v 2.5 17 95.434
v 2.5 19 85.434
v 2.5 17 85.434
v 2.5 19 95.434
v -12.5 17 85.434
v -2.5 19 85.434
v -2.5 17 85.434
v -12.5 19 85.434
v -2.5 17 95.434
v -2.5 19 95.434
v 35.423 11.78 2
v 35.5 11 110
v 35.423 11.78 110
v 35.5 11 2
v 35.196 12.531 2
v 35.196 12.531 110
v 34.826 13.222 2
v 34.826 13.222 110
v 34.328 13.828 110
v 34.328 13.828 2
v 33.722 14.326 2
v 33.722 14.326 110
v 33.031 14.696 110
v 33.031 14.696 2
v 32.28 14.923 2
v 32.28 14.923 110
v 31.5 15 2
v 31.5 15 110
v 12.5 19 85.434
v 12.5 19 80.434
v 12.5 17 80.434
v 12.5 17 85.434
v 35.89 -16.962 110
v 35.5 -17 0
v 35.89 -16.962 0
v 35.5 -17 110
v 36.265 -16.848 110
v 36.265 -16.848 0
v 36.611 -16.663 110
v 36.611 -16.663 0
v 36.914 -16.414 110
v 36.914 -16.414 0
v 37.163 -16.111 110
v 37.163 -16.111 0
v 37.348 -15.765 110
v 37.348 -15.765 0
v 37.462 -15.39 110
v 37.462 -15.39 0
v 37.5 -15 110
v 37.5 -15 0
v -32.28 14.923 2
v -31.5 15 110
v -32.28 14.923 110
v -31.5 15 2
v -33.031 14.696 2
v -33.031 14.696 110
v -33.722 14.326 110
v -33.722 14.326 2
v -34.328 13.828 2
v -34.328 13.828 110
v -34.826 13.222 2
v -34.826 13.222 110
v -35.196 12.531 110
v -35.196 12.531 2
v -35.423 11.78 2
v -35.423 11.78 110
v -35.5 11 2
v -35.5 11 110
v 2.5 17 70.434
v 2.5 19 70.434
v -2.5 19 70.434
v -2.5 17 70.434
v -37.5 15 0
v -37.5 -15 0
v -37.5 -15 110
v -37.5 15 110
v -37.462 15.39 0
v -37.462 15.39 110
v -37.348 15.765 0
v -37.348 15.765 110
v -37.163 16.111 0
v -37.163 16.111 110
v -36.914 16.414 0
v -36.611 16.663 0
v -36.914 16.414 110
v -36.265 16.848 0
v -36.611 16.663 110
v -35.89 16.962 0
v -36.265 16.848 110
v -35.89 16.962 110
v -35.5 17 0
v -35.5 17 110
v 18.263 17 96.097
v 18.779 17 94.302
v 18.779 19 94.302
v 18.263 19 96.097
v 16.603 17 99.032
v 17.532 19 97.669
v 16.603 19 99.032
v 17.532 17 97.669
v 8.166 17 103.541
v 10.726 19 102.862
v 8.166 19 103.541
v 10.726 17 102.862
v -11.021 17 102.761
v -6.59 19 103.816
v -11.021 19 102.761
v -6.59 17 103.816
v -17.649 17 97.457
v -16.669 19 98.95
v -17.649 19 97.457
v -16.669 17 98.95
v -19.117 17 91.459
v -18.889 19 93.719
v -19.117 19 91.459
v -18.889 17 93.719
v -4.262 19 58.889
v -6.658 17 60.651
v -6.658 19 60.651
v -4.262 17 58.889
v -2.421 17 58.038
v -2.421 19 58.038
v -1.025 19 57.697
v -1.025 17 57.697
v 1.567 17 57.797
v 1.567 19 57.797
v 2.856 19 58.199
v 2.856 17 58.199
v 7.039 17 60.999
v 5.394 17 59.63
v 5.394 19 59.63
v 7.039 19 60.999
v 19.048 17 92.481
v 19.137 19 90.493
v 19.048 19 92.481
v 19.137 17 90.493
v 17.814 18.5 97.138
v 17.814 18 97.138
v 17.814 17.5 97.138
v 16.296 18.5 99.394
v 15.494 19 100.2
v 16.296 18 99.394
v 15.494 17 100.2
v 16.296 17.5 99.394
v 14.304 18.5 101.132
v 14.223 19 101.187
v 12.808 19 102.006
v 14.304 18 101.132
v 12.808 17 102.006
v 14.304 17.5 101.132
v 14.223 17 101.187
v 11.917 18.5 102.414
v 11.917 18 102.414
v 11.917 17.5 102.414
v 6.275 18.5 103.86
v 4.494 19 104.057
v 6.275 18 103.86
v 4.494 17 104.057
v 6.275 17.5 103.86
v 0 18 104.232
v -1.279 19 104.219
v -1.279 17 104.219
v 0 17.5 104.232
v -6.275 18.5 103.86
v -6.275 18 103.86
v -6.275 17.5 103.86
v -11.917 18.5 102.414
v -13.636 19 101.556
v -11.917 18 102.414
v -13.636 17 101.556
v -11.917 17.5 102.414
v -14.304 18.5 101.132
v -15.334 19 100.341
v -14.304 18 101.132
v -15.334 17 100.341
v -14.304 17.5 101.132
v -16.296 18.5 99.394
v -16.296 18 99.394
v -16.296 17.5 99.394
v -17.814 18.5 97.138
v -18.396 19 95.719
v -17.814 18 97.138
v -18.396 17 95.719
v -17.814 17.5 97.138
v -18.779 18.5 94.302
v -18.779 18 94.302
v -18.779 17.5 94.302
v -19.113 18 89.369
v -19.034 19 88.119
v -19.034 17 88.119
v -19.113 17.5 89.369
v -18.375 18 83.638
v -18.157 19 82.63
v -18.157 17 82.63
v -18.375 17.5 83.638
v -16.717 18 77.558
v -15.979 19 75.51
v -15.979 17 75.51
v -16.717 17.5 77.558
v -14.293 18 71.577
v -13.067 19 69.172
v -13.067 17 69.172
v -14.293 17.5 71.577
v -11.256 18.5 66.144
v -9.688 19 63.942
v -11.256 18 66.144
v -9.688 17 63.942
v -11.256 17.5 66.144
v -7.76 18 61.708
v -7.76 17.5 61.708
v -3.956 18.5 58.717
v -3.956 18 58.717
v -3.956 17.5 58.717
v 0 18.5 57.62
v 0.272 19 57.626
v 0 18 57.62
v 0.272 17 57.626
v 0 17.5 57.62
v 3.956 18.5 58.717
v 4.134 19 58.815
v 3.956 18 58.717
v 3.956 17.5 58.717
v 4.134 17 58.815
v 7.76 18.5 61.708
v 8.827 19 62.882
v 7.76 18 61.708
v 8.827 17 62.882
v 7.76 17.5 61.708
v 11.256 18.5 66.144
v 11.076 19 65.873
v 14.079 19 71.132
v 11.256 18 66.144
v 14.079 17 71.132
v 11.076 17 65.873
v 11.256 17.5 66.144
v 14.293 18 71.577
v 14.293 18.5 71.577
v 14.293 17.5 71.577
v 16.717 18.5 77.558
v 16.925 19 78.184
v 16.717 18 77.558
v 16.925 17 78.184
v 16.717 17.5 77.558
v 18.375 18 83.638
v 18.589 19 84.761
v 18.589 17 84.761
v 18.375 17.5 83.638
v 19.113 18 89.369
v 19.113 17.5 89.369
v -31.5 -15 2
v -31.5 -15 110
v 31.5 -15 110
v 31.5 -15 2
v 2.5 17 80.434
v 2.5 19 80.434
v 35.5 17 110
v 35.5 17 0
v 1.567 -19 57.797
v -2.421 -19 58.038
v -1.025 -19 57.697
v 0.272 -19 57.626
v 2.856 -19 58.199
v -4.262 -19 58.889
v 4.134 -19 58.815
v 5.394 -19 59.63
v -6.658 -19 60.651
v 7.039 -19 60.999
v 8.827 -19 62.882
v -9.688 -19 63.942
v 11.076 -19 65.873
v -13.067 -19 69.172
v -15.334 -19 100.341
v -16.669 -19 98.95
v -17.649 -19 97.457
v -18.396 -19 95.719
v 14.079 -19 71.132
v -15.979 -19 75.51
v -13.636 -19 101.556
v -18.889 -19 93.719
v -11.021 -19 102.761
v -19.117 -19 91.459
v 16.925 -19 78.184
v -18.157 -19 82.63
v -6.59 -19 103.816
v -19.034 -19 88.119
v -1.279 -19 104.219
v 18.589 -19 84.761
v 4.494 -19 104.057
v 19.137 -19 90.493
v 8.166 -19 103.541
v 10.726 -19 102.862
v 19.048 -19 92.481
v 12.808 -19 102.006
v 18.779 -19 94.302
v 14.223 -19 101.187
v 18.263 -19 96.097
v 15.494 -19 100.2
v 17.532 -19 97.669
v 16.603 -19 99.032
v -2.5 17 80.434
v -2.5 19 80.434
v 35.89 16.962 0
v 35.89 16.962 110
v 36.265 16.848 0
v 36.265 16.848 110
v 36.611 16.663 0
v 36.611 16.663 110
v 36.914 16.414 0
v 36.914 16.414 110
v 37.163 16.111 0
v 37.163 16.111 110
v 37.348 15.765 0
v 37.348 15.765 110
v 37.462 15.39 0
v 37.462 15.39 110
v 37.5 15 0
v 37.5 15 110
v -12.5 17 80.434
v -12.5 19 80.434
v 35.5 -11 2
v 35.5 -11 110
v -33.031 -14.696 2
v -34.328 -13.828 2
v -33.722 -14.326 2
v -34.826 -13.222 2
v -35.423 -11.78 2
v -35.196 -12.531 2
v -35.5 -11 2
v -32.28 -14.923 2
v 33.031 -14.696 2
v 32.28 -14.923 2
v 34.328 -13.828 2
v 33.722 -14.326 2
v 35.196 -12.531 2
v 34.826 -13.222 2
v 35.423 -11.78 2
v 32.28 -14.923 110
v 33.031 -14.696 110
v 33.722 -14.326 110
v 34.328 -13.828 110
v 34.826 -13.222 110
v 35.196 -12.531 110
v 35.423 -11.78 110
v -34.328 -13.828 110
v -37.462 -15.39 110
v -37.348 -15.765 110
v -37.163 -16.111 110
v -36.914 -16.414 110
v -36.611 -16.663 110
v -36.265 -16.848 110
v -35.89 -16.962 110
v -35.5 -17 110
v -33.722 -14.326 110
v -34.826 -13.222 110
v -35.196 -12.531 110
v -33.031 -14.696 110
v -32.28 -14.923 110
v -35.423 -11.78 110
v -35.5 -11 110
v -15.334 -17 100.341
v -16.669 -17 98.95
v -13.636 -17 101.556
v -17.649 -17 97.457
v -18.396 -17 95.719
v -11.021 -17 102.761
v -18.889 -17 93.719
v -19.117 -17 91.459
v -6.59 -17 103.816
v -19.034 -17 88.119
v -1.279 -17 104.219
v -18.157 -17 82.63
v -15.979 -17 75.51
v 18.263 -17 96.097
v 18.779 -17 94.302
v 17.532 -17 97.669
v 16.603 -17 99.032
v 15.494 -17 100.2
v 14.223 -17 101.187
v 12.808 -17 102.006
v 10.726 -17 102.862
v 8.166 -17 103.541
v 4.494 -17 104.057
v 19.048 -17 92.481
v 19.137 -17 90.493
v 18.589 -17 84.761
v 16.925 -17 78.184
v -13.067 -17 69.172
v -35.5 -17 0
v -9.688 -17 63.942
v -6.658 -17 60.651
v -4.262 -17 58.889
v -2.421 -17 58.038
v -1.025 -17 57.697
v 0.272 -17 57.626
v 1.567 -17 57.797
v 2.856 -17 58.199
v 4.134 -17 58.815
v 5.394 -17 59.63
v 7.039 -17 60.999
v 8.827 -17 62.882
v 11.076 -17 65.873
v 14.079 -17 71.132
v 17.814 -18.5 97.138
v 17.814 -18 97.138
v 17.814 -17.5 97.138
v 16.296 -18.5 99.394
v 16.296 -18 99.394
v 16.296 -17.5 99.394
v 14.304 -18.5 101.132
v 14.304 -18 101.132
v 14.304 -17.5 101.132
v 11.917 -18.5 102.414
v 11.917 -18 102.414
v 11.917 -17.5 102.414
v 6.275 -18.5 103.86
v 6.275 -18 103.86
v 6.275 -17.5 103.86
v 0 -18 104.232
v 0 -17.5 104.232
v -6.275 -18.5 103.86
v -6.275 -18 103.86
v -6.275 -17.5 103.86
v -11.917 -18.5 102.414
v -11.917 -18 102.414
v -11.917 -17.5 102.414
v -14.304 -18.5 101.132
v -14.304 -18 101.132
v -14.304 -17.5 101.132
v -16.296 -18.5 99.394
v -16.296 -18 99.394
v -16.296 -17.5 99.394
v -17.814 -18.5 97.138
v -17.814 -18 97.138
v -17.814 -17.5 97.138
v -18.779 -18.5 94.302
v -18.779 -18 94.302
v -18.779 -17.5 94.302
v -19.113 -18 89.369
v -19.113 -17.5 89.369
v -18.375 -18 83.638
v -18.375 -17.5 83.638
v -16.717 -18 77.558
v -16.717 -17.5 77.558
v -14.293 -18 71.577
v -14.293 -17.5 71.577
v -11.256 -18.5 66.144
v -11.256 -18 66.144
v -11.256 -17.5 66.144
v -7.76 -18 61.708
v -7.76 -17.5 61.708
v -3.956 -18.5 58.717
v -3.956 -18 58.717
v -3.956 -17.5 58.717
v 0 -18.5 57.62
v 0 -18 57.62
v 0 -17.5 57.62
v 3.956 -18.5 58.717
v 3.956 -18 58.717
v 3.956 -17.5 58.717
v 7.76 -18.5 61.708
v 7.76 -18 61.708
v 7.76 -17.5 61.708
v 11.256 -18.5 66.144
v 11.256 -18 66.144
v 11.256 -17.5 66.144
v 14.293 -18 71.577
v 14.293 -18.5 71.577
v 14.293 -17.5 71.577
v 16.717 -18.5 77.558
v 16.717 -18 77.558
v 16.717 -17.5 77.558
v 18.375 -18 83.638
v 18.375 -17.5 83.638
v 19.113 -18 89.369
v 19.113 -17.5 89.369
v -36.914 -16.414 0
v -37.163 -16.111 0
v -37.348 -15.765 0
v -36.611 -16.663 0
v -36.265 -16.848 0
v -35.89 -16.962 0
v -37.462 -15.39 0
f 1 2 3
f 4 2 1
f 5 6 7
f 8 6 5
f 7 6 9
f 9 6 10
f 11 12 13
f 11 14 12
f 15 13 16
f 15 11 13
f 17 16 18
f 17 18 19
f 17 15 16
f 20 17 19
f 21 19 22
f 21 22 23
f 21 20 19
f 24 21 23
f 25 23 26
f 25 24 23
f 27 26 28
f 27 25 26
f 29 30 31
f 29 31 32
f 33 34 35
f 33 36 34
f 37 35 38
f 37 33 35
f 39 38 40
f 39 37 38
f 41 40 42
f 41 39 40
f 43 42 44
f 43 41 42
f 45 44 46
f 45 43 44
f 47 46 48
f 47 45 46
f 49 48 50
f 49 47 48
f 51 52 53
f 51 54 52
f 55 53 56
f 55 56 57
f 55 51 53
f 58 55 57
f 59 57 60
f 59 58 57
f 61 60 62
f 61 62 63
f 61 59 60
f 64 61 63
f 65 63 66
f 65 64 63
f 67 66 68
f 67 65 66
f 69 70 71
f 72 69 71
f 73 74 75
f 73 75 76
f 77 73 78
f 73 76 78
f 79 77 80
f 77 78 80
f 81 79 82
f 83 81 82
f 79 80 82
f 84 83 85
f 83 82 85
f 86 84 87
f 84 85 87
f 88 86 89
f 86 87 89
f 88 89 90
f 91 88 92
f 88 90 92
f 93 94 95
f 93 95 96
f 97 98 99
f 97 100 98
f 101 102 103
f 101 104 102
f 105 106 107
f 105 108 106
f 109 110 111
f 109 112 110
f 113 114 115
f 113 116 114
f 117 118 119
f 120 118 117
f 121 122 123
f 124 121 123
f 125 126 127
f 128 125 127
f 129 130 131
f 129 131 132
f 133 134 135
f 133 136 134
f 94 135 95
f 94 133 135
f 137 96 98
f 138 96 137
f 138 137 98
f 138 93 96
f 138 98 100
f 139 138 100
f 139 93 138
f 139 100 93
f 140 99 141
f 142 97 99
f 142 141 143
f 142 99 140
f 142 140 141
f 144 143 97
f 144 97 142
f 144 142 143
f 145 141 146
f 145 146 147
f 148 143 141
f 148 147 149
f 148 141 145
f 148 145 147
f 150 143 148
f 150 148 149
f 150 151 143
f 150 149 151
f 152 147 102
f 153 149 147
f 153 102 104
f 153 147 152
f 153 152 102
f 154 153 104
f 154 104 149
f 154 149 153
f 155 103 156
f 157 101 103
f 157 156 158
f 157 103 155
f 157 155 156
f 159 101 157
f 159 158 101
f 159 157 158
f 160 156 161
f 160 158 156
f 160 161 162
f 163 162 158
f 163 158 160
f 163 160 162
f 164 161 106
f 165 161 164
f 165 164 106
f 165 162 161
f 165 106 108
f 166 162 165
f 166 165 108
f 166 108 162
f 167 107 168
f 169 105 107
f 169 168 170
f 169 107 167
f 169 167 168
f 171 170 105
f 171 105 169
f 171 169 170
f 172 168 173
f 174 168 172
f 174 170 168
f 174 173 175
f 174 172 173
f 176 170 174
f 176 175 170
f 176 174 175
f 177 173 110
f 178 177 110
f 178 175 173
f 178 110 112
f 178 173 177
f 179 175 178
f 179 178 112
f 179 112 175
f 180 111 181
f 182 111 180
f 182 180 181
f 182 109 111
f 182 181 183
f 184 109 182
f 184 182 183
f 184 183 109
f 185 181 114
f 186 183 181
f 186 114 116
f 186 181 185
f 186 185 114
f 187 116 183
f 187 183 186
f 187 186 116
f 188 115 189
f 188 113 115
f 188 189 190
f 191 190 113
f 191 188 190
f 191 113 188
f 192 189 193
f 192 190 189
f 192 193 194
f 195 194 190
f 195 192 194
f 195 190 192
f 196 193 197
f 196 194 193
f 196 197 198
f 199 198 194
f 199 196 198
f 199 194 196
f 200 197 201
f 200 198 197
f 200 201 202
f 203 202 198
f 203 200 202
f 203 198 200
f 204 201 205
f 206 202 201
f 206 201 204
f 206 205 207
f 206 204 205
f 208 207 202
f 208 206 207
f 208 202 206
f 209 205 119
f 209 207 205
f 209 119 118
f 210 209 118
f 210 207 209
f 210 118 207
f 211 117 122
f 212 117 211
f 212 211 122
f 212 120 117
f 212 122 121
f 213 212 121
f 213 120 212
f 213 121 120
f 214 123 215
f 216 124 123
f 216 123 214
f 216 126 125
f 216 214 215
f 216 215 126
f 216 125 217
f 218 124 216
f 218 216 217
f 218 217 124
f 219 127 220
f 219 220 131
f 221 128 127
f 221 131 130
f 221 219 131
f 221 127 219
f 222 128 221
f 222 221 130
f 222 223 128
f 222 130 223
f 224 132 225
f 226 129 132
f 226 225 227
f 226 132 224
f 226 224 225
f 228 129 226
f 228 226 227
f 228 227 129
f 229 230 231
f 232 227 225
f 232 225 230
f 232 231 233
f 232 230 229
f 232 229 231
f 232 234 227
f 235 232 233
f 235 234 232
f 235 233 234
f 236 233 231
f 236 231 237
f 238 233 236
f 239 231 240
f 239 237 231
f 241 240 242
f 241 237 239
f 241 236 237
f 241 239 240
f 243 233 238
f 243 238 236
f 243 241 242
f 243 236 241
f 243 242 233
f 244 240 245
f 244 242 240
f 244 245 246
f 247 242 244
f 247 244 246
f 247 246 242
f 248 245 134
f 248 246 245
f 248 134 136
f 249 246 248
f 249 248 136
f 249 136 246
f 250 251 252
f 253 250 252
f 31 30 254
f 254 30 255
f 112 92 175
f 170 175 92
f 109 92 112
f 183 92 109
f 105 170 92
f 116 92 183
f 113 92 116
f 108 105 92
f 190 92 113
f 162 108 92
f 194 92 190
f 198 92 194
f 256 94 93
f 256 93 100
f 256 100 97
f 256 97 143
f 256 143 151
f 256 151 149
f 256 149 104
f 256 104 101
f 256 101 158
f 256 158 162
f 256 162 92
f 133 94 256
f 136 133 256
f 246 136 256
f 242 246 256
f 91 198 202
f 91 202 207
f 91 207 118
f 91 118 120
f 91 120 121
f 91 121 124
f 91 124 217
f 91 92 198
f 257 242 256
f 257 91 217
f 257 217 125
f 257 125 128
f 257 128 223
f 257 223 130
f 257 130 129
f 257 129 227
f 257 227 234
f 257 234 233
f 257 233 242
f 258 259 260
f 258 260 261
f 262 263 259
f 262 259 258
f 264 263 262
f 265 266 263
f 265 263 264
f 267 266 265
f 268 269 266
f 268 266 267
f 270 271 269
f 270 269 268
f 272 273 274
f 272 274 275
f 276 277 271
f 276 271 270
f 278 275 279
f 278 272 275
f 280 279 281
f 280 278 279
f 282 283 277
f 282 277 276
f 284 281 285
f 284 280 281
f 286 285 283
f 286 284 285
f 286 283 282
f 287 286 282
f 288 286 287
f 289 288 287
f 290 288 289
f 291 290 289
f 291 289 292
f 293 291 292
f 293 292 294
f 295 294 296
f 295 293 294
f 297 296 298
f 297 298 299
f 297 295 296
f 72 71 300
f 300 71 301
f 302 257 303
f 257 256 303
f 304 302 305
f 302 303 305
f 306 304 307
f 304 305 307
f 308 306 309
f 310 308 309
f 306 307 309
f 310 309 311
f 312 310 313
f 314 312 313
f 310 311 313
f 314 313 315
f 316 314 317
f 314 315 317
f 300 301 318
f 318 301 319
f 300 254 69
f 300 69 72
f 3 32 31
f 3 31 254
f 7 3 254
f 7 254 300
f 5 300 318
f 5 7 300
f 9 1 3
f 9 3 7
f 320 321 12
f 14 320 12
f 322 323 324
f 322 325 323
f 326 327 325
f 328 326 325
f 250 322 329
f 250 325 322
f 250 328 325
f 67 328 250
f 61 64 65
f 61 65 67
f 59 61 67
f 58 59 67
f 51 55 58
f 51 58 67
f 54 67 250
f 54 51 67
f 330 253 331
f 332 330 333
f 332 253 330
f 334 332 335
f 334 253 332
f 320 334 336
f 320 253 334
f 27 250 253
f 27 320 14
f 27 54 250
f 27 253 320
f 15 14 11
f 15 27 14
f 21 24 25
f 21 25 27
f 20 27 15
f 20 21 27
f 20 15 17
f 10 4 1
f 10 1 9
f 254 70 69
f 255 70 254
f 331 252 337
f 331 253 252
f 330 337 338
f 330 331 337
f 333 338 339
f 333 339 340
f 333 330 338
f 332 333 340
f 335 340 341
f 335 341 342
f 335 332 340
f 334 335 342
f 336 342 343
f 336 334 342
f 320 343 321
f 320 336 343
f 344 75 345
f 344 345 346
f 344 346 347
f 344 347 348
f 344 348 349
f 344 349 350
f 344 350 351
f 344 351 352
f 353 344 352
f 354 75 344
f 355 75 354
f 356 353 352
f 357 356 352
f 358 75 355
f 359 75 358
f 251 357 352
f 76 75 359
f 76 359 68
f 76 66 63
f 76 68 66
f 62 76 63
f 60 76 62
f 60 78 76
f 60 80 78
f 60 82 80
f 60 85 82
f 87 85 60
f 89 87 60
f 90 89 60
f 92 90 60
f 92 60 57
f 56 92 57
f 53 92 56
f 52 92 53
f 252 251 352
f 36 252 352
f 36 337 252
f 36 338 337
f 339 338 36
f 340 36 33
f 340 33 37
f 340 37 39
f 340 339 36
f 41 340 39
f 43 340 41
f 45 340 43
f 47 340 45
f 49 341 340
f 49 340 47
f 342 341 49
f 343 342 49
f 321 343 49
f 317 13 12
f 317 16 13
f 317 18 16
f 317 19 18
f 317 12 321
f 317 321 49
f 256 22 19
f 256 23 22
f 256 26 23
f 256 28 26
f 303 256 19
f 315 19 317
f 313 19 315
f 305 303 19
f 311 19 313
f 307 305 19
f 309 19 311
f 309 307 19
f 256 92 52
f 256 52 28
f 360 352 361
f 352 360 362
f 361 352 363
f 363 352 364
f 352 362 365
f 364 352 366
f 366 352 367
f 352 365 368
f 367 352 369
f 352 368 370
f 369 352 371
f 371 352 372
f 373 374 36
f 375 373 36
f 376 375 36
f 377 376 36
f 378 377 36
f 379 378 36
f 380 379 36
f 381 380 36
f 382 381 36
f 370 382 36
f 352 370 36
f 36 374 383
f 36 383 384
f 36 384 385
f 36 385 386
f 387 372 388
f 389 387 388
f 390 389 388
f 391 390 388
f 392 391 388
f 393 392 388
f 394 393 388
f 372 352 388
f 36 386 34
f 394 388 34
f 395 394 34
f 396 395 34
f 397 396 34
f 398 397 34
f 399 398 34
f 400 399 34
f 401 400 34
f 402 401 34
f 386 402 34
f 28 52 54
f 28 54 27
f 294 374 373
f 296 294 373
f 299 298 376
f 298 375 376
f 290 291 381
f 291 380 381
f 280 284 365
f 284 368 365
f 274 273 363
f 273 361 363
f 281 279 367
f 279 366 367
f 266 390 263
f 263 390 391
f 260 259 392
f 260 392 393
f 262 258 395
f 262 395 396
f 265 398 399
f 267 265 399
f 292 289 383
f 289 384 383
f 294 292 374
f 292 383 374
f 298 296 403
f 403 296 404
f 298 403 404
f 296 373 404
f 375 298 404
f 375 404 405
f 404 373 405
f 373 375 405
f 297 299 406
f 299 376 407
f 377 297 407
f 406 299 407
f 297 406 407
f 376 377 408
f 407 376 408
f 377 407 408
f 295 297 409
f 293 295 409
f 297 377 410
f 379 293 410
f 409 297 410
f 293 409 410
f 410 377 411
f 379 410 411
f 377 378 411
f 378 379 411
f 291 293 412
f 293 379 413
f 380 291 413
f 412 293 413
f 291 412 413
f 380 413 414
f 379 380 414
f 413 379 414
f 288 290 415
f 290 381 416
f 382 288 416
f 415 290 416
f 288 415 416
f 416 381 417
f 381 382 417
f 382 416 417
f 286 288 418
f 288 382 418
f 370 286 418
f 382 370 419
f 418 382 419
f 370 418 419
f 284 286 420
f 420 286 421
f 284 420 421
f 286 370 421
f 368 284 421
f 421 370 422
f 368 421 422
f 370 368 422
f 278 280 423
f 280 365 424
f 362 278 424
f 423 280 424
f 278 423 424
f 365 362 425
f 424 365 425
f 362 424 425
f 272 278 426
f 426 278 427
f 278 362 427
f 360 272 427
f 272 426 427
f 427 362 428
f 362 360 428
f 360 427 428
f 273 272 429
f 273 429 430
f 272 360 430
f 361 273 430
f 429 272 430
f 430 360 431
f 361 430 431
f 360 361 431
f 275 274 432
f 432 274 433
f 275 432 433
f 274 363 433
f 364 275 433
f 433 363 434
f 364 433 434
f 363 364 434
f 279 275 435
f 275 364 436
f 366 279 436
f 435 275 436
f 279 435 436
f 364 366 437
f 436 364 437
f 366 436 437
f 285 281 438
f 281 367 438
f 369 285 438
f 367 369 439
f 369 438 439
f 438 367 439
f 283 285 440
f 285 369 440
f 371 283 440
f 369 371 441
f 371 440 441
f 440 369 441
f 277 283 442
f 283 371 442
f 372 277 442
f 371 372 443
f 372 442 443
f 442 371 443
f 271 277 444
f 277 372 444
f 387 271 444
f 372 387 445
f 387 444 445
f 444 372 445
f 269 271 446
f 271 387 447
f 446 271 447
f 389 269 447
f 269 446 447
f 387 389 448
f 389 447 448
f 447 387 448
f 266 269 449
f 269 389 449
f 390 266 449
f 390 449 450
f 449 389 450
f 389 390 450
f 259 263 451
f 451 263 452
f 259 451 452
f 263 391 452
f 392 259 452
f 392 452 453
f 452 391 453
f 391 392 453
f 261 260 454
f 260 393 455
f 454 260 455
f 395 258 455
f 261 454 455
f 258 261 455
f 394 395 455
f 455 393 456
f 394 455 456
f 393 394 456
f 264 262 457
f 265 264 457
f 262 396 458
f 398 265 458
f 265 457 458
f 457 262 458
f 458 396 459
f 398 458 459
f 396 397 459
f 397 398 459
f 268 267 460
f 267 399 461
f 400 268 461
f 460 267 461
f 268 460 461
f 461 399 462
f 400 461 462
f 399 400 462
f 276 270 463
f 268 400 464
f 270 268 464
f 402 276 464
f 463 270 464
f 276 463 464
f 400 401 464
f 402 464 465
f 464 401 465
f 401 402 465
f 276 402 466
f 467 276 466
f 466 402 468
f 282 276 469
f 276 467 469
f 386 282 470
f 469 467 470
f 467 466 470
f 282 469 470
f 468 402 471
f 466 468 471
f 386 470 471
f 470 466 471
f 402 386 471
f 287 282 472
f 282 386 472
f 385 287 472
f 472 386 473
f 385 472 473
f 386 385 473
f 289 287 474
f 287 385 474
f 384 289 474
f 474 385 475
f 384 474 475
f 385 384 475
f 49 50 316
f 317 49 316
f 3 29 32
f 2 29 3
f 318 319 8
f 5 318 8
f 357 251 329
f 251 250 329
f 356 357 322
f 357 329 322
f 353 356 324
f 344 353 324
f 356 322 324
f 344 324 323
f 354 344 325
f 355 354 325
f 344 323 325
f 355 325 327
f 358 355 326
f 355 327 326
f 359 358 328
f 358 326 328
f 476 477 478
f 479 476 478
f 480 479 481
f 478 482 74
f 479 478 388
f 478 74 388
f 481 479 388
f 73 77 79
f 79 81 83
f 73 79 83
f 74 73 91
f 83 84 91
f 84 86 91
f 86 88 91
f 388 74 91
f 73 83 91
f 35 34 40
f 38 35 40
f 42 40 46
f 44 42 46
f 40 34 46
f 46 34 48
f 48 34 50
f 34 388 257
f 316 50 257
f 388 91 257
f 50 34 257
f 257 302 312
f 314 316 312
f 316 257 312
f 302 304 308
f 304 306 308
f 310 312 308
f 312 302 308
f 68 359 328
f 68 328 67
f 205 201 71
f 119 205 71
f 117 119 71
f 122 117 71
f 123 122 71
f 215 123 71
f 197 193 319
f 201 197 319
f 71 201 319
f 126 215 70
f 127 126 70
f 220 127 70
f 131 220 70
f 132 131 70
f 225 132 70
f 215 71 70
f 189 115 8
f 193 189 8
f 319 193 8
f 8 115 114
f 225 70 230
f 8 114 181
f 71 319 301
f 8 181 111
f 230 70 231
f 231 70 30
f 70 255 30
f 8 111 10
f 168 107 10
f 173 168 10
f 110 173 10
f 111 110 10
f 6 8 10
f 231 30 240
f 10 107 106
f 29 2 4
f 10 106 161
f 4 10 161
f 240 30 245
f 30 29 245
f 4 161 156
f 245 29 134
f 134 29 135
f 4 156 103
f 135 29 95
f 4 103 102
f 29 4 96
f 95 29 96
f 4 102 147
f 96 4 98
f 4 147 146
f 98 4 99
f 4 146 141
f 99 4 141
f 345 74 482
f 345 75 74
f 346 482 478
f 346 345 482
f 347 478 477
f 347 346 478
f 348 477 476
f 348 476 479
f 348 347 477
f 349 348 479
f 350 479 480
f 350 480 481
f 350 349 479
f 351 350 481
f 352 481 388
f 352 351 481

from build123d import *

# Parameters (mm, degrees)
F0_W      = 75
F0_H      = 34
F2_DEPTH  = 110
F3_W      = 71
F3_H      = 30
F4_DEPTH  = 108
F5_R      = 2
F6_R      = 4
F8_DEPTH  = 2
F10_W     = 5
F10_H     = 10
F10_W_2   = 10
F10_H_2   = 5
F11_DEPTH = 2


with BuildPart() as f2:
    # F0 (on Top) → F2 (new body)
    with BuildSketch(Plane.XY):
        Rectangle(F0_W, F0_H)
    extrude(amount=F2_DEPTH)

    # F3 (on face) → F4 (cut)
    with BuildSketch(Plane.XY.offset(110)):
        Rectangle(F3_W, F3_H)
    extrude(amount=-F4_DEPTH, mode=Mode.SUBTRACT)

    # F5
    f5_edges = [f2.edges().sort_by_distance(p)[0] for p in [
        (-37.5, 17, 55),
        (37.5, 17, 55),
        (37.5, -17, 55),
        (-37.5, -17, 55),
    ]]
    fillet(f5_edges, radius=F5_R)

    # F6
    f6_edges = [f2.edges().sort_by_distance(p)[0] for p in [
        (-35.5, 15, 56),
        (-35.5, -15, 56),
        (35.5, 15, 56),
        (35.5, -15, 56),
    ]]
    fillet(f6_edges, radius=F6_R)

    # F7 (on face) → F8 (join)
    with BuildSketch(Plane.XZ.offset(17)):
        with BuildLine():
            add(Edge.make_bspline(
                [(18.7785252929, 94.3015664816), (17.0131724762, 102.694836153), (0, 105.7685942517), (-28.8612375736, 100.5542544303), (0, 32.6291322034), (21.2373277439, 82.6113299209), (18.7785252929, 94.3015664816)],
                knots=[0, 0, 0, 0, 0.2089592717, 0.4179185434, 0.7089592717, 1, 1, 1, 1], degree=3))
        make_face()
    extrude(amount=F8_DEPTH)

    # F9: F2 across plane


with BuildPart() as f2_1:
    add(f2.part)
    add(f2.part.mirror(Plane.XZ))

    # F10 (on face) → F11 (cut)
    with BuildSketch(Plane(origin=(0, 19, 0), x_dir=(-1, 0, 0), z_dir=(0, 1, 0))):
        with Locations((0, 90.4341701968)):
            Rectangle(F10_W, F10_H)
        with Locations((-7.5, 82.9341701968)):
            Rectangle(F10_W_2, F10_H_2)
        with Locations((0, 82.9341701968)):
            Rectangle(F10_W, F10_H_2)
        with Locations((7.5, 82.9341701968)):
            Rectangle(F10_W_2, F10_H_2)
        with Locations((0, 75.4341701968)):
            Rectangle(F10_W, F10_H)
    extrude(amount=-F11_DEPTH, mode=Mode.SUBTRACT)


solid = f2_1.part
